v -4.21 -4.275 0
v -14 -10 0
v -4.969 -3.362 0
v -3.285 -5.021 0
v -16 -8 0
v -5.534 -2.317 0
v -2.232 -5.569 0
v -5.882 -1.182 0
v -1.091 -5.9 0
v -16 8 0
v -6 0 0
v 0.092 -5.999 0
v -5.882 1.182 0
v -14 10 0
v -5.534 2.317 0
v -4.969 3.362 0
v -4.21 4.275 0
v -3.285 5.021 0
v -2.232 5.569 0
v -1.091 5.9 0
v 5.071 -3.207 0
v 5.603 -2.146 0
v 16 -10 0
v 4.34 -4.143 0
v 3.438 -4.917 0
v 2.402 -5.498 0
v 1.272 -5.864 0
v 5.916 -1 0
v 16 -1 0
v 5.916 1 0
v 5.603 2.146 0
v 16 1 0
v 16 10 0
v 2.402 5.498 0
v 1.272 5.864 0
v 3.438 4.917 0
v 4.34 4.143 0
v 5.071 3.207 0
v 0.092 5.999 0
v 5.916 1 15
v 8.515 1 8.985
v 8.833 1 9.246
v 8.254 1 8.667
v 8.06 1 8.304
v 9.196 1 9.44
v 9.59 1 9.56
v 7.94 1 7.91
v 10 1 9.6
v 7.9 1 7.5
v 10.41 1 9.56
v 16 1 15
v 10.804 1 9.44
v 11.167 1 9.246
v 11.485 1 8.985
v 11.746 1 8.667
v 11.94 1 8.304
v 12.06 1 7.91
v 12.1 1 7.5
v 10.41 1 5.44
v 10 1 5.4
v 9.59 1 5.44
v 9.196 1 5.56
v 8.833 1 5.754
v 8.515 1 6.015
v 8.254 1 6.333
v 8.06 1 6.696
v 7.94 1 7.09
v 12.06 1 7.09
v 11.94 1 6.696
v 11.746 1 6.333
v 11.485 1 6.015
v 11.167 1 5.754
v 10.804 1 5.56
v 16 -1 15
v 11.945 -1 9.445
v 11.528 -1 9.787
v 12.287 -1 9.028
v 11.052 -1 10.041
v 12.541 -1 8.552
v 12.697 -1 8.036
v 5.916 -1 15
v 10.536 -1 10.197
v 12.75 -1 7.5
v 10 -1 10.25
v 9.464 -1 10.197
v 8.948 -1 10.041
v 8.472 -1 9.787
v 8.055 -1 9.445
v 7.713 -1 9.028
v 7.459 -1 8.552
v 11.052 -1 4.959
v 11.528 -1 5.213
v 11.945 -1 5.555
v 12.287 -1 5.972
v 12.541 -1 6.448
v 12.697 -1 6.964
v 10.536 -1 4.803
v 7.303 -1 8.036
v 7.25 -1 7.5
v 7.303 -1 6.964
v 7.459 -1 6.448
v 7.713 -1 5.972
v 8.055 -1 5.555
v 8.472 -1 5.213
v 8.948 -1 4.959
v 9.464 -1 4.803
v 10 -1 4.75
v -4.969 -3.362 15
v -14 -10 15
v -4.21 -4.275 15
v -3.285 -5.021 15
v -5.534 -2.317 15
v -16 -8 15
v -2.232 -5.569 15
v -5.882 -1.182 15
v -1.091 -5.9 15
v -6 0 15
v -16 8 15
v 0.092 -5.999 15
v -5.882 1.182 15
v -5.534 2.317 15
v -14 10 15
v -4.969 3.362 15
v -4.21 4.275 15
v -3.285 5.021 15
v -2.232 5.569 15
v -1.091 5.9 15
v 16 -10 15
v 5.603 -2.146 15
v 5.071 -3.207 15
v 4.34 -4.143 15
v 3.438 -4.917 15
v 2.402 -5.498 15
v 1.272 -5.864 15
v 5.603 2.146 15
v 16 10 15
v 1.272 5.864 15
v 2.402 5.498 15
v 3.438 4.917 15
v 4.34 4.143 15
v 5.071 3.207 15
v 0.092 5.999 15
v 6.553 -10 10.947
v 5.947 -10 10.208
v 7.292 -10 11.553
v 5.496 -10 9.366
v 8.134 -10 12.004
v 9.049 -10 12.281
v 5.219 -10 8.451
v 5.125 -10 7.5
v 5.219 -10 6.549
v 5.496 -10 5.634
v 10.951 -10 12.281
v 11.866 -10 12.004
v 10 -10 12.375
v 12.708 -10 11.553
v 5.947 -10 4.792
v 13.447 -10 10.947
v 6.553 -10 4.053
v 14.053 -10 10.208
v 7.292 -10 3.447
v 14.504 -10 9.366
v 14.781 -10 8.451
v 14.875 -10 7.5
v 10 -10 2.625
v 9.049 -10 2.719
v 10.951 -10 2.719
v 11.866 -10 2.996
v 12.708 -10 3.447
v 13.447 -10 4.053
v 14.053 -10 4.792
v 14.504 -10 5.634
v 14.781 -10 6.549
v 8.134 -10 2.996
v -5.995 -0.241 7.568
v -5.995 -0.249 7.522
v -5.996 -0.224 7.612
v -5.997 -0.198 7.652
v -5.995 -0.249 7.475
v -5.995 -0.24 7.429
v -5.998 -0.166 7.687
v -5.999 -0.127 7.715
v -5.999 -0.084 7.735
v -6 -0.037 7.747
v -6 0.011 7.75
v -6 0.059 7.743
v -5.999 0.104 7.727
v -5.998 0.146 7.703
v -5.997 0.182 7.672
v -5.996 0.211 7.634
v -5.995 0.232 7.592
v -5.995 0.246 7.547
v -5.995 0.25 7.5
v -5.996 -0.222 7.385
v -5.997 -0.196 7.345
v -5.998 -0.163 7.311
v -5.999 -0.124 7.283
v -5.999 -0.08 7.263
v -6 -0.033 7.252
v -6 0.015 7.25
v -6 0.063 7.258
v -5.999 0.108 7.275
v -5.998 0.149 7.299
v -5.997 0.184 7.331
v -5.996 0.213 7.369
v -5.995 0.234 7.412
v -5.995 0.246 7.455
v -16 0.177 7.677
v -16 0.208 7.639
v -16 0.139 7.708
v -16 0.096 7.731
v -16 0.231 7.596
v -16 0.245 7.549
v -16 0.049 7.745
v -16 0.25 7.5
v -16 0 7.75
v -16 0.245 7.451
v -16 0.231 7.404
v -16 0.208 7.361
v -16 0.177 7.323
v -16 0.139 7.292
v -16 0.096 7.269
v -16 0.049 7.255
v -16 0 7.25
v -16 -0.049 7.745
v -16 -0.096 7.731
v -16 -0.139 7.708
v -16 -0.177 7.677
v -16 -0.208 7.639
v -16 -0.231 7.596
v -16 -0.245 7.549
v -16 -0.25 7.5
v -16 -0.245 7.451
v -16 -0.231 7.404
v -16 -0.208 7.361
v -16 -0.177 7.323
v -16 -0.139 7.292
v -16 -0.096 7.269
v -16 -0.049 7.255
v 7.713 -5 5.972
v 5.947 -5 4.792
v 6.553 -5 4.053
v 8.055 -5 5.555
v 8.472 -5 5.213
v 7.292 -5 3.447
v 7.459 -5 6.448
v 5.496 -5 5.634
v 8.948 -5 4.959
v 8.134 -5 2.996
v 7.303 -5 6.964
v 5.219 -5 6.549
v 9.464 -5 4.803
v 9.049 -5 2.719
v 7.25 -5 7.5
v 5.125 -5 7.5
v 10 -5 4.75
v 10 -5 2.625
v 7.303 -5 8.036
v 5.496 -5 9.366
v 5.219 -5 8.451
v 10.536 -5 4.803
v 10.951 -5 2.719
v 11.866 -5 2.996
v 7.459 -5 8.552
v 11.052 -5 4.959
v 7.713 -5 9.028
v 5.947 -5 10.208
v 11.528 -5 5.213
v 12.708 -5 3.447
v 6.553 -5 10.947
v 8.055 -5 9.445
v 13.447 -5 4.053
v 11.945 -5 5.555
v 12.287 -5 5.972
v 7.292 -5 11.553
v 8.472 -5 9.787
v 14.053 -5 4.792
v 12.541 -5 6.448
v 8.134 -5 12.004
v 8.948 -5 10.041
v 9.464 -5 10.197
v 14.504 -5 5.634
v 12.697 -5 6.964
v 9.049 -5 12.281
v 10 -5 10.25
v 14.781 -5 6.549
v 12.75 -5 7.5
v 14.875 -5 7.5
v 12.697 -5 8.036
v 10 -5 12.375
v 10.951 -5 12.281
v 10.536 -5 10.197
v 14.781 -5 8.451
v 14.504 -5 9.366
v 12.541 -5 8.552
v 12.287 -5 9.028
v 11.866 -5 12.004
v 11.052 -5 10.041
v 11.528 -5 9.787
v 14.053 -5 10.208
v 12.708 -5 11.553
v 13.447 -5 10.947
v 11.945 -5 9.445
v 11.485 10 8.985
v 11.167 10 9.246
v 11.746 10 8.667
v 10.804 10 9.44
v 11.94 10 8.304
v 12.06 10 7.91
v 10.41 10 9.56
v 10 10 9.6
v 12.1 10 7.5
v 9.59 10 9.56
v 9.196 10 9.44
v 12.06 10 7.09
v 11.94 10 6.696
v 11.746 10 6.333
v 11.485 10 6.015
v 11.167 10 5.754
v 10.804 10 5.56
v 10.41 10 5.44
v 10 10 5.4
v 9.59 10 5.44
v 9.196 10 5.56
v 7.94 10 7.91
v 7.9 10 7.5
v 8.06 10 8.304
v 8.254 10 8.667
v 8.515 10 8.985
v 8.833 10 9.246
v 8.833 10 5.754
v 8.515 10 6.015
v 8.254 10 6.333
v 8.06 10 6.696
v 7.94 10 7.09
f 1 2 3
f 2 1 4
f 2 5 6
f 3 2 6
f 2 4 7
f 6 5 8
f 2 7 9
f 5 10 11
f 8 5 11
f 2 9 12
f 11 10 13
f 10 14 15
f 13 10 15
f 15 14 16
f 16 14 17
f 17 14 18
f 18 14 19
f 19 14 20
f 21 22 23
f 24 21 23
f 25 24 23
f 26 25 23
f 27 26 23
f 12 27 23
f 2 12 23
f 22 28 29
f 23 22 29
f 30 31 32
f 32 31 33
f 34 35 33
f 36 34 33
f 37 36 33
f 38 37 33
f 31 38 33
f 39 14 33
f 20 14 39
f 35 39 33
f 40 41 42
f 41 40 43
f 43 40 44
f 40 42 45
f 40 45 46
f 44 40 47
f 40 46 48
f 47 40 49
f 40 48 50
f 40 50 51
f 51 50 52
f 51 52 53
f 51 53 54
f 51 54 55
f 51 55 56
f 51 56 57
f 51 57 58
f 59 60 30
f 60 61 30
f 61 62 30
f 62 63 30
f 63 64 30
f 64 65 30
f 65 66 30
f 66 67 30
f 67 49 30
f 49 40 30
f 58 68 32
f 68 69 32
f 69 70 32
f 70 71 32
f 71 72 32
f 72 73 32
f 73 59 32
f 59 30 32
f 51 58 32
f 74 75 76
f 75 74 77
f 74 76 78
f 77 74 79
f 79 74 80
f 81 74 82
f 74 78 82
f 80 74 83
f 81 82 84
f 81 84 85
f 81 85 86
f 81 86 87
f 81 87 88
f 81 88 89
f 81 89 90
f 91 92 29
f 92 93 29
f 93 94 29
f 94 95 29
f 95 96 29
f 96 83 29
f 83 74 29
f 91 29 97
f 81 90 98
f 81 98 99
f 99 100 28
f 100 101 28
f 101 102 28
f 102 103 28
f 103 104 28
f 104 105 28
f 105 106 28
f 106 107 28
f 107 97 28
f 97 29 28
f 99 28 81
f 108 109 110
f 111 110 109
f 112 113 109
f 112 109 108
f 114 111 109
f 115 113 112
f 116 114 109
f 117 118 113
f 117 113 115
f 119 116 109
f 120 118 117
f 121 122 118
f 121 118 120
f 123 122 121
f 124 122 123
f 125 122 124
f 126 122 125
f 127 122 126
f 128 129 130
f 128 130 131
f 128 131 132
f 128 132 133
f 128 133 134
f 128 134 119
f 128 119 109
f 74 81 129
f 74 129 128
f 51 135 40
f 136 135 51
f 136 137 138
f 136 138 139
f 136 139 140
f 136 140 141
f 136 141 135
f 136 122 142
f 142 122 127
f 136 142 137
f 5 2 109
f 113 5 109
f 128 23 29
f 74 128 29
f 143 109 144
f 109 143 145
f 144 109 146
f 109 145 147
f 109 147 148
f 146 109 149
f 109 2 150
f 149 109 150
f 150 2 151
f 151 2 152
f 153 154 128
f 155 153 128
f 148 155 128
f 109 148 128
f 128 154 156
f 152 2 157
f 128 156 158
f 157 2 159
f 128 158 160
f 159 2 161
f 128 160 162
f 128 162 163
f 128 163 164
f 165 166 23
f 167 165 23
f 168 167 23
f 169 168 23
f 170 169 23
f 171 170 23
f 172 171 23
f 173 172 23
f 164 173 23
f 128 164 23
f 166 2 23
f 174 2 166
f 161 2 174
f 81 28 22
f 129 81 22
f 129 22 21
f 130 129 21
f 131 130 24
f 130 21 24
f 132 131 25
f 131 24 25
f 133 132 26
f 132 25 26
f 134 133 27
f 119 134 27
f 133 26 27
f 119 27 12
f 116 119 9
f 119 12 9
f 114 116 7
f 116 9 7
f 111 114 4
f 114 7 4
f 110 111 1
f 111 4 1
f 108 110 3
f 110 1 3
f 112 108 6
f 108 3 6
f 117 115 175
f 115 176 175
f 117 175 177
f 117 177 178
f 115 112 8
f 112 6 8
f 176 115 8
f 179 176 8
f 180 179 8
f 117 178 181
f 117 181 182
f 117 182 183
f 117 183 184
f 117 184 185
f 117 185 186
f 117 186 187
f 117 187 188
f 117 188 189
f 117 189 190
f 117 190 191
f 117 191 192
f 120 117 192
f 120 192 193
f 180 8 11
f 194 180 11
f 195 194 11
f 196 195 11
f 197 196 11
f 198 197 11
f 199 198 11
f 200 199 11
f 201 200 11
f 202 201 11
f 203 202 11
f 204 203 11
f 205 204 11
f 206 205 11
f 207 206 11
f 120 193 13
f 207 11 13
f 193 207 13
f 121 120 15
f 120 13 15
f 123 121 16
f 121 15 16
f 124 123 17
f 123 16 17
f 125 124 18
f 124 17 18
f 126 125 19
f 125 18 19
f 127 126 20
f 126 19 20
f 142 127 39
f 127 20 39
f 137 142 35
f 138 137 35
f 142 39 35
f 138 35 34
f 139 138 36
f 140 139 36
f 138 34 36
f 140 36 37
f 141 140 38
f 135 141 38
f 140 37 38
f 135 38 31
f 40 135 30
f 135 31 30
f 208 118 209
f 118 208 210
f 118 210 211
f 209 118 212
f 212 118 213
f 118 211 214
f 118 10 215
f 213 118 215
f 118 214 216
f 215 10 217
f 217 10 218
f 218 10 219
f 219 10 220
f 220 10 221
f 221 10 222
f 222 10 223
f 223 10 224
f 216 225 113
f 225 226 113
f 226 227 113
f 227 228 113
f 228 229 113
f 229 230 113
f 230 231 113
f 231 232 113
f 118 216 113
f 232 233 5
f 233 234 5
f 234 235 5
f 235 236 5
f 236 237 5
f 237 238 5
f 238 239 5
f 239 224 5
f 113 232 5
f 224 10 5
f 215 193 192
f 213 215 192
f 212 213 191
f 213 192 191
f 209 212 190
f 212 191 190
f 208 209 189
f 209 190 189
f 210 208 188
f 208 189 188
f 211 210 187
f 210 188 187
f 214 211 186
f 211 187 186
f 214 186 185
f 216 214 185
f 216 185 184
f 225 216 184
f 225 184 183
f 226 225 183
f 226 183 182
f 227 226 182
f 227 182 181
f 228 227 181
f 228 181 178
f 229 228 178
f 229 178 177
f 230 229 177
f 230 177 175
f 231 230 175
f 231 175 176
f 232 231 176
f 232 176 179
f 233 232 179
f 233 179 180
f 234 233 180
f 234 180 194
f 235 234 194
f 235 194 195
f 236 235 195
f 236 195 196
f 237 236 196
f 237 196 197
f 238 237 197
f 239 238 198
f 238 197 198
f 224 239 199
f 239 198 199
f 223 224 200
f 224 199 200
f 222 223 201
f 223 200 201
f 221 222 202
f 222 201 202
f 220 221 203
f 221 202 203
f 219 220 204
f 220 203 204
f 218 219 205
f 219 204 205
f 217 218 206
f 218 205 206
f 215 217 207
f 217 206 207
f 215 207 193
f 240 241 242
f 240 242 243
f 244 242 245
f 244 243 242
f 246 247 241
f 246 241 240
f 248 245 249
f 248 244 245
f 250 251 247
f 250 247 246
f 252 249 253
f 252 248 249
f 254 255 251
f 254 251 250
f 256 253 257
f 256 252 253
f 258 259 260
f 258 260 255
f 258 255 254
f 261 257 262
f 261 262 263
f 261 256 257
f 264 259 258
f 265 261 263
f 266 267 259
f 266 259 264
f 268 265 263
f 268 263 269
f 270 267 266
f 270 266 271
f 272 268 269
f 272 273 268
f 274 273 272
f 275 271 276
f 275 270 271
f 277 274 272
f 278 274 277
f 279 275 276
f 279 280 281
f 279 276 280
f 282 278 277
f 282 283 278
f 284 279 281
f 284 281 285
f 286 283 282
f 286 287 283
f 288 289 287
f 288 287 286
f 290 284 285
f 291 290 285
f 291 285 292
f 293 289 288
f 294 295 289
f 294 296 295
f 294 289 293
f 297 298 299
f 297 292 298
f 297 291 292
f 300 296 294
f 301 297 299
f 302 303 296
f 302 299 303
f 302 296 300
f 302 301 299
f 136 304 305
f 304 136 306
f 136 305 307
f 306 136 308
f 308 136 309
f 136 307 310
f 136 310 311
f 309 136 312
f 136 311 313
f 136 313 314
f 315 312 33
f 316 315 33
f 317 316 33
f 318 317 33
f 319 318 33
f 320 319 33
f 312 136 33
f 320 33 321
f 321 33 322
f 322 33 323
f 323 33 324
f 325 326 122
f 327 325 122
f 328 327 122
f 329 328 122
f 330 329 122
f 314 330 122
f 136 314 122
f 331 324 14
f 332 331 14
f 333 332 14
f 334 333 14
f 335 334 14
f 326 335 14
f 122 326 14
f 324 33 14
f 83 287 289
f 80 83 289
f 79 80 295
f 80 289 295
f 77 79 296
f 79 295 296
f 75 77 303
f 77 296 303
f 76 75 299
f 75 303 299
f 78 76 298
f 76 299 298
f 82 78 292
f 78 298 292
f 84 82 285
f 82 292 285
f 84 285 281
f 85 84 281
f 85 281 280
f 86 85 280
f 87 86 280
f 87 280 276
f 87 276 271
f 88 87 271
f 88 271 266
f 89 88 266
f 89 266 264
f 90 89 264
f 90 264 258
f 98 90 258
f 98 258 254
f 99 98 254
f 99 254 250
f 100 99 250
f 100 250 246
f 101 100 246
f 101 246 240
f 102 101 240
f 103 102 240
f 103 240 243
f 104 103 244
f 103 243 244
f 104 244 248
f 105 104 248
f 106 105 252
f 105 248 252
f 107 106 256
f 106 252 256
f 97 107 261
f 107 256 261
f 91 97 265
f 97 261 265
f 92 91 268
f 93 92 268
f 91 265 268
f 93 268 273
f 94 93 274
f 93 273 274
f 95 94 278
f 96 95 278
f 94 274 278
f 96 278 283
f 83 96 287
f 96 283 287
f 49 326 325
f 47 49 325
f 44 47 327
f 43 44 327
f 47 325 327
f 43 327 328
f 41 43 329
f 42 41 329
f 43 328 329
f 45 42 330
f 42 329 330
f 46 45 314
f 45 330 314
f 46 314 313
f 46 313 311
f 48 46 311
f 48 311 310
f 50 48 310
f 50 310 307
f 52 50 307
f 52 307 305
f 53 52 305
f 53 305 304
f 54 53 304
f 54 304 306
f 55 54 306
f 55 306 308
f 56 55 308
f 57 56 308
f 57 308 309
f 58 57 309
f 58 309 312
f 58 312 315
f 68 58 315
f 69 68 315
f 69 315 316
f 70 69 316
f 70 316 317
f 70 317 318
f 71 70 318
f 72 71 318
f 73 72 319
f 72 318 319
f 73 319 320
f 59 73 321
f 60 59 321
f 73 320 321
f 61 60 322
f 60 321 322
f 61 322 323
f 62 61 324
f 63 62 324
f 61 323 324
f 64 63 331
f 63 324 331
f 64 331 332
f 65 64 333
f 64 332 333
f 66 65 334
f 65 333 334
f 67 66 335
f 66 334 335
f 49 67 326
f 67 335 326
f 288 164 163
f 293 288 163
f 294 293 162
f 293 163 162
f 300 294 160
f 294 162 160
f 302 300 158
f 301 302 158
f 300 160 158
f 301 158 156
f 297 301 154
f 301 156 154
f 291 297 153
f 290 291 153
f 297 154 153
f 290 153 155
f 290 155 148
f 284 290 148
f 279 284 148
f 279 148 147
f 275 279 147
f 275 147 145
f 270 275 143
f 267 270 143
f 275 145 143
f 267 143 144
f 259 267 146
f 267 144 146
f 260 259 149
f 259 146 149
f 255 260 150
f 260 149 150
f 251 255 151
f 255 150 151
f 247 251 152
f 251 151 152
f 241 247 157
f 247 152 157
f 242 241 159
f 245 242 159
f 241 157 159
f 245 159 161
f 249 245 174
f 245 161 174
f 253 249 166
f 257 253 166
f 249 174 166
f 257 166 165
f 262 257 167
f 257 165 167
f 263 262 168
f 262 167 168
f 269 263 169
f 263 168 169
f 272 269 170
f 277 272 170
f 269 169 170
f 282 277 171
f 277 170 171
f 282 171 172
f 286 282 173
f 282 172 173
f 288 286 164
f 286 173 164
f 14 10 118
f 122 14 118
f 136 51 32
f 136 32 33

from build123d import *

# Parameters (mm, degrees)
F1_DEPTH = 15
F2_SIZE2 = 2
F2_SIZE  = 2
F3_R     = 2.75
F4_DEPTH = 10
F6_D     = 4.2
F5_R     = 4.875
F5_R_2   = 2.75
F7_DEPTH = 5
F9_D     = 0.5


with BuildPart() as f1:
    # F0 (on Top) → F1 (new body)
    with BuildSketch(Plane.XY):
        with BuildLine():
            ThreePointArc((5.9160797831, -1), (-6, 0), (5.9160797831, 1))
            Line((5.9160797831, 1), (16, 1))
            Line((16, 1), (16, 10))
            Line((16, 10), (-16, 10))
            Line((-16, 10), (-16, -10))
            Line((-16, -10), (16, -10))
            Line((16, -10), (16, -1))
            Line((16, -1), (5.9160797831, -1))
        make_face()
    extrude(amount=F1_DEPTH)

    # F2
    f2_edges = [f1.edges().sort_by_distance(p)[0] for p in [
        (-16, 10, 7.5),
        (-16, -10, 7.5),
    ]]
    chamfer(f2_edges, length=F2_SIZE, length2=F2_SIZE2)

    # F3 (on face) → F4 (cut)
    with BuildSketch(Plane.XZ.offset(10)):
        with Locations((10, 7.5)):
            Circle(F3_R)
    extrude(amount=-F4_DEPTH, mode=Mode.SUBTRACT)

    # F6 (through all)
    with Locations(Plane.XZ.offset(10)):
        with Locations((10, 7.5)):
            Hole(F6_D / 2)

    # F5 (on face) → F7 (cut)
    with BuildSketch(Plane.XZ.offset(10)):
        with Locations((10, 7.5)):
            Circle(F5_R)
        with Locations((10, 7.5)):
            Circle(F5_R_2, mode=Mode.SUBTRACT)
    extrude(amount=-F7_DEPTH, mode=Mode.SUBTRACT)

    # F9 (through all)
    with Locations(Plane(origin=(-16, 0, 0), x_dir=(0, -1, 0), z_dir=(-1, 0, 0))):
        with Locations((0, 7.5)):
            Hole(F9_D / 2)


solid = f1.part
